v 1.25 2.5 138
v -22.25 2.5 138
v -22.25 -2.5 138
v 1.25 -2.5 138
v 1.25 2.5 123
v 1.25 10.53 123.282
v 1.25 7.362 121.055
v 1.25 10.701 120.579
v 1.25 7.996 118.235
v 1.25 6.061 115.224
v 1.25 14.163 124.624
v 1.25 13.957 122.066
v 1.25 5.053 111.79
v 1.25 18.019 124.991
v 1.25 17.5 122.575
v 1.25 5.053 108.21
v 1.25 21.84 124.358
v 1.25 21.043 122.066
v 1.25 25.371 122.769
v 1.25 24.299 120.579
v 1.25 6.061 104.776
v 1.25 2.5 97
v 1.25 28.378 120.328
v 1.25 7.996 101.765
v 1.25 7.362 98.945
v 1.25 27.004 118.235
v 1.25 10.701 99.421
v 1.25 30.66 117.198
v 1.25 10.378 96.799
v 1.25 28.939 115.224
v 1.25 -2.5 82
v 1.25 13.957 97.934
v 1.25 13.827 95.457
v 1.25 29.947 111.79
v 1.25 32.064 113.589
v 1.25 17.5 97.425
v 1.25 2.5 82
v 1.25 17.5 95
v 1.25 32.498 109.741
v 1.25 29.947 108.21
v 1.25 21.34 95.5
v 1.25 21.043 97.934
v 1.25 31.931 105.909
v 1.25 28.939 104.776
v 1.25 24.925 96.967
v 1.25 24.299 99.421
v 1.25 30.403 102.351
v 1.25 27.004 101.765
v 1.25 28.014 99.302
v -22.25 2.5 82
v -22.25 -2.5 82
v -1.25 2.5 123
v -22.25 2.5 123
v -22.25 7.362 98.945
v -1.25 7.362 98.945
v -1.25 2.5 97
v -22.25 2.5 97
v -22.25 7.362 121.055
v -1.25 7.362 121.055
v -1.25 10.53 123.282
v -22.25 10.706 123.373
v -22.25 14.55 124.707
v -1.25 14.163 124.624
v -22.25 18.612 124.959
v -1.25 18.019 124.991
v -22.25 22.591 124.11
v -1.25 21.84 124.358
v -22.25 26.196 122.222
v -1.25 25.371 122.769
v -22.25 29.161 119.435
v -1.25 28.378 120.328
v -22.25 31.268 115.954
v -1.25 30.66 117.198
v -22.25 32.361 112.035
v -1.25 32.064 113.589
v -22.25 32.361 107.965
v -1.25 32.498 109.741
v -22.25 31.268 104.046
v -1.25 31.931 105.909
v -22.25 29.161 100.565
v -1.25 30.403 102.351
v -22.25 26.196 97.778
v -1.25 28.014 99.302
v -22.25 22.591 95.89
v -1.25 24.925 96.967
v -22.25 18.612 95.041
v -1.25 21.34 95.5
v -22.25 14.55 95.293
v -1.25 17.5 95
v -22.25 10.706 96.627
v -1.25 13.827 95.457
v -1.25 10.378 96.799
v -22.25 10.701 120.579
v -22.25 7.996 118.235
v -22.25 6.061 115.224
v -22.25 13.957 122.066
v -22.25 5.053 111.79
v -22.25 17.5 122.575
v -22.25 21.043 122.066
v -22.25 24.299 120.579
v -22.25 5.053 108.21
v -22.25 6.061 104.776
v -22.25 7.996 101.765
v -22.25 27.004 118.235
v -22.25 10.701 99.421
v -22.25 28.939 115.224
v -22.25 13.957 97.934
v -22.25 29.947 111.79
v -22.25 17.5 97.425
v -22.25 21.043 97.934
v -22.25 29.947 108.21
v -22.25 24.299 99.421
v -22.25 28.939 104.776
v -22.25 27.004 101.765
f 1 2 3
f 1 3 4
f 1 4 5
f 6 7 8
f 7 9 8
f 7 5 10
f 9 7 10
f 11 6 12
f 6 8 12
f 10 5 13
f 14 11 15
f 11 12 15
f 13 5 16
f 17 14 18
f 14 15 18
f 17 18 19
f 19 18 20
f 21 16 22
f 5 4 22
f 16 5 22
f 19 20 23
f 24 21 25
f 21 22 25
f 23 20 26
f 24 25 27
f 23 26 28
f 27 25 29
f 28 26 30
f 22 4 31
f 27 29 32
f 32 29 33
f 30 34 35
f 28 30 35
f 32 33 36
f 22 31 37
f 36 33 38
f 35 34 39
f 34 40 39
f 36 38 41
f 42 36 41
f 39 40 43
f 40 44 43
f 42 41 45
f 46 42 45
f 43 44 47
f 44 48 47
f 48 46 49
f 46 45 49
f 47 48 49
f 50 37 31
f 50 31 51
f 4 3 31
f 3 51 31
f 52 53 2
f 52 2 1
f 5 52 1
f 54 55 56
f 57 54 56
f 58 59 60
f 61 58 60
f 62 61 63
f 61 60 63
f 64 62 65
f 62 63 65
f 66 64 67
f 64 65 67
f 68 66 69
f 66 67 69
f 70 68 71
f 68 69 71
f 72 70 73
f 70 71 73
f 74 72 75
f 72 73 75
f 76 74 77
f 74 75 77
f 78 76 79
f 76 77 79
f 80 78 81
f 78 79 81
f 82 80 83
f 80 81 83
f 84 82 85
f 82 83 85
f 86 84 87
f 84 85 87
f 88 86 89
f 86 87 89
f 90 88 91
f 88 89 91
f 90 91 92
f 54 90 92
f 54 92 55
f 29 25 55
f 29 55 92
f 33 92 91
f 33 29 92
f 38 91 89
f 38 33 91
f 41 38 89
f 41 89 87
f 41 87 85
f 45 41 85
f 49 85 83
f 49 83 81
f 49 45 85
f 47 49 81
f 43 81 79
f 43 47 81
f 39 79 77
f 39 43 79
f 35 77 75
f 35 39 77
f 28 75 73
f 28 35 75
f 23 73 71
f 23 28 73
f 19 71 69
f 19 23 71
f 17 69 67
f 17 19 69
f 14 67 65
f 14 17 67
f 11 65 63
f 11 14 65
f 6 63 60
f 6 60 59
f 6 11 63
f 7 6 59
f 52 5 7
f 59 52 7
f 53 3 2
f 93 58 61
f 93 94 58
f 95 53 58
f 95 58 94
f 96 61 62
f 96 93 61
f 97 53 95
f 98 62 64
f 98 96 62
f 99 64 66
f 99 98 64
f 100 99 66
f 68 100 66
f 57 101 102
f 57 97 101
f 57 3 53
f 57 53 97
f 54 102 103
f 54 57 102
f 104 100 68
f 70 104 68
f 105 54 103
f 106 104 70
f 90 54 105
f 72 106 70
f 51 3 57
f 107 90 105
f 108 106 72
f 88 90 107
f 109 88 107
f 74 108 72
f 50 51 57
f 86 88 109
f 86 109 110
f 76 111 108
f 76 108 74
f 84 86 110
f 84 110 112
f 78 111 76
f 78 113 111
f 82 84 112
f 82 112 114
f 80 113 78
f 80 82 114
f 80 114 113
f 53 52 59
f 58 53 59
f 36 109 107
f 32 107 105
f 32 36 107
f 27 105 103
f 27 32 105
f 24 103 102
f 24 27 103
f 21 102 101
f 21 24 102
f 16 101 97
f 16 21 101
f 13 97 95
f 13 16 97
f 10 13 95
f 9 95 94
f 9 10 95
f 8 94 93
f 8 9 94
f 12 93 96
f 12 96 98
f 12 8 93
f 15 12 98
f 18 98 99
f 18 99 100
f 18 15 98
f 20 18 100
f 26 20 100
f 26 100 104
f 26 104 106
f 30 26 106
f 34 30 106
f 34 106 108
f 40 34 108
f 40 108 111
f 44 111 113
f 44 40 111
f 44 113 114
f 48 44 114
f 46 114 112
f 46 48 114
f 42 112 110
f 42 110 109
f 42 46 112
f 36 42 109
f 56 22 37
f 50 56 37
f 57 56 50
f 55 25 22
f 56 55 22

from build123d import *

# Parameters (mm, degrees)
CROQUIS1_R              = 2.5
SALIENTE_EXTRUIR1_DEPTH = 1.25
SALIENTE_EXTRUIR4_DEPTH = 2.5
CROQUIS6_R              = 12.575
CORTAR_EXTRUIR3_DEPTH   = 10
SALIENTE_EXTRUIR5_DEPTH = 200
CROQUIS8_R              = 12.575
SALIENTE_EXTRUIR6_DEPTH = 21
CROQUIS9_W              = 200
CROQUIS9_H              = 30.25
CROQUIS9_H_2            = 5
CROQUIS9_W_2            = 2
CORTAR_EXTRUIR6_DEPTH   = 133.67370689
CROQUIS10_W             = 23.5
CROQUIS10_H             = 5
SALIENTE_EXTRUIR7_DEPTH = 15
CROQUIS11_W             = 23.5
CROQUIS11_H             = 5
SALIENTE_EXTRUIR8_DEPTH = 15


with BuildPart() as part:
    # Croquis1 → Saliente-Extruir1 (new, symmetric)
    with BuildSketch(Plane(origin=(0, 0, 0), x_dir=(0, 0, -1), z_dir=(1, 0, 0))):
        with BuildLine():
            Line((125, -2.5), (-125, -2.5))
            Line((-125, -2.5), (-125, 2.5))
            Line((-125, 2.5), (-123, 2.5))
            Line((-123, 2.5), (-117, 17.5))
            ThreePointArc((-117, 17.5), (-110, 24.5), (-103, 17.5))
            Line((-103, 17.5), (-97, 2.5))
            Line((-97, 2.5), (125, 2.5))
            Line((125, 2.5), (125, -2.5))
        make_face()
        with Locations((-110, 17.5)):
            Circle(CROQUIS1_R, mode=Mode.SUBTRACT)
    extrude(amount=SALIENTE_EXTRUIR1_DEPTH, both=True)

    # Croquis5 → Saliente-Extruir4 (add, through all)
    with BuildSketch(Plane(origin=(1.25, 0, 0), x_dir=(0, 0, -1), z_dir=(1, 0, 0))):
        with BuildLine():
            ThreePointArc((-100, 10), (-110, 5), (-120, 10))
            Line((-120, 10), (-121.0552482, 7.361879501))
            ThreePointArc((-121.0552482, 7.361879501), (-110, 2.5), (-98.9447518, 7.361879501))
            Line((-98.9447518, 7.361879501), (-100, 10))
        make_face()
        with BuildLine():
            Line((-121.0552482, 7.361879501), (-120, 10))
            ThreePointArc((-120, 10), (-113.952847075, 29.358541226), (-97.5, 17.5))
            ThreePointArc((-97.5, 17.5), (-98.141458774, 13.547152925), (-100, 10))
            Line((-100, 10), (-98.9447518, 7.361879501))
            ThreePointArc((-98.9447518, 7.361879501), (-96.020931308, 12.060731804), (-95, 17.5))
            ThreePointArc((-95, 17.5), (-115.439268196, 31.479068692), (-121.0552482, 7.361879501))
        make_face()
    extrude(amount=-SALIENTE_EXTRUIR4_DEPTH)

    # Croquis6 → Cortar-Extruir3 (cut)
    with BuildSketch(Plane(origin=(1.25, 0, 0), x_dir=(0, 0, -1), z_dir=(1, 0, 0))):
        with Locations((-110, 17.5)):
            Circle(CROQUIS6_R)
    extrude(amount=-CORTAR_EXTRUIR3_DEPTH, mode=Mode.SUBTRACT)

    # Croquis7 → Saliente-Extruir5 (add)
    with BuildSketch(Plane(origin=(0, 0, -125), x_dir=(-1, 0, 0), z_dir=(0, 0, -1))):
        Polygon((3.75, 37.75), (3.75, -2.5), (1.25, -2.5), (1.25, 2.5), (1.25, 32.75), (-1.25, 32.75), (-1.25, 37.75), align=None)
    extrude(amount=-SALIENTE_EXTRUIR5_DEPTH)

    # Croquis8 → Saliente-Extruir6 (add)
    with BuildSketch(Plane.ZY.offset(1.25)):
        with BuildLine():
            Line((98.9447518, 7.361879501), (97, 2.5))
            Line((97, 2.5), (95, 2.5))
            Line((95, 2.5), (95, -2.5))
            Line((95, -2.5), (125, -2.5))
            Line((125, -2.5), (125, 2.5))
            Line((125, 2.5), (123, 2.5))
            Line((123, 2.5), (121.0552482, 7.361879501))
            ThreePointArc((121.0552482, 7.361879501), (110, 32.5), (98.9447518, 7.361879501))
        make_face()
        with Locations(Location((110, 17.5, 0), (0, 0, 180))):
            Circle(CROQUIS8_R, mode=Mode.SUBTRACT)
    extrude(amount=SALIENTE_EXTRUIR6_DEPTH)

    # Croquis9 → Cortar-Extruir6 (cut, through all)
    with BuildSketch(Plane(origin=(1.25, 0, 0), x_dir=(0, 0, -1), z_dir=(1, 0, 0))):
        Polygon((-75, 2.5), (-97, 2.5), (-97, -2.5), (125, -2.5), (125, 2.5), align=None)
        with Locations((25, 17.625)):
            Rectangle(CROQUIS9_W, CROQUIS9_H)
        with Locations((25, 35.25)):
            Rectangle(CROQUIS9_W, CROQUIS9_H_2)
        with Locations((-124, 0)):
            Rectangle(CROQUIS9_W_2, CROQUIS9_H_2)
    extrude(amount=-CORTAR_EXTRUIR6_DEPTH, mode=Mode.SUBTRACT)

    # Croquis10 → Saliente-Extruir7 (add)
    with BuildSketch(Plane(origin=(0, 0, 97), x_dir=(-1, 0, 0), z_dir=(0, 0, -1))):
        with Locations((10.5, 0)):
            Rectangle(CROQUIS10_W, CROQUIS10_H)
    extrude(amount=SALIENTE_EXTRUIR7_DEPTH)

    # Croquis11 → Saliente-Extruir8 (add)
    with BuildSketch(Plane.XY.offset(123)):
        with Locations((-10.5, 0)):
            Rectangle(CROQUIS11_W, CROQUIS11_H)
    extrude(amount=SALIENTE_EXTRUIR8_DEPTH)


solid = part.part
